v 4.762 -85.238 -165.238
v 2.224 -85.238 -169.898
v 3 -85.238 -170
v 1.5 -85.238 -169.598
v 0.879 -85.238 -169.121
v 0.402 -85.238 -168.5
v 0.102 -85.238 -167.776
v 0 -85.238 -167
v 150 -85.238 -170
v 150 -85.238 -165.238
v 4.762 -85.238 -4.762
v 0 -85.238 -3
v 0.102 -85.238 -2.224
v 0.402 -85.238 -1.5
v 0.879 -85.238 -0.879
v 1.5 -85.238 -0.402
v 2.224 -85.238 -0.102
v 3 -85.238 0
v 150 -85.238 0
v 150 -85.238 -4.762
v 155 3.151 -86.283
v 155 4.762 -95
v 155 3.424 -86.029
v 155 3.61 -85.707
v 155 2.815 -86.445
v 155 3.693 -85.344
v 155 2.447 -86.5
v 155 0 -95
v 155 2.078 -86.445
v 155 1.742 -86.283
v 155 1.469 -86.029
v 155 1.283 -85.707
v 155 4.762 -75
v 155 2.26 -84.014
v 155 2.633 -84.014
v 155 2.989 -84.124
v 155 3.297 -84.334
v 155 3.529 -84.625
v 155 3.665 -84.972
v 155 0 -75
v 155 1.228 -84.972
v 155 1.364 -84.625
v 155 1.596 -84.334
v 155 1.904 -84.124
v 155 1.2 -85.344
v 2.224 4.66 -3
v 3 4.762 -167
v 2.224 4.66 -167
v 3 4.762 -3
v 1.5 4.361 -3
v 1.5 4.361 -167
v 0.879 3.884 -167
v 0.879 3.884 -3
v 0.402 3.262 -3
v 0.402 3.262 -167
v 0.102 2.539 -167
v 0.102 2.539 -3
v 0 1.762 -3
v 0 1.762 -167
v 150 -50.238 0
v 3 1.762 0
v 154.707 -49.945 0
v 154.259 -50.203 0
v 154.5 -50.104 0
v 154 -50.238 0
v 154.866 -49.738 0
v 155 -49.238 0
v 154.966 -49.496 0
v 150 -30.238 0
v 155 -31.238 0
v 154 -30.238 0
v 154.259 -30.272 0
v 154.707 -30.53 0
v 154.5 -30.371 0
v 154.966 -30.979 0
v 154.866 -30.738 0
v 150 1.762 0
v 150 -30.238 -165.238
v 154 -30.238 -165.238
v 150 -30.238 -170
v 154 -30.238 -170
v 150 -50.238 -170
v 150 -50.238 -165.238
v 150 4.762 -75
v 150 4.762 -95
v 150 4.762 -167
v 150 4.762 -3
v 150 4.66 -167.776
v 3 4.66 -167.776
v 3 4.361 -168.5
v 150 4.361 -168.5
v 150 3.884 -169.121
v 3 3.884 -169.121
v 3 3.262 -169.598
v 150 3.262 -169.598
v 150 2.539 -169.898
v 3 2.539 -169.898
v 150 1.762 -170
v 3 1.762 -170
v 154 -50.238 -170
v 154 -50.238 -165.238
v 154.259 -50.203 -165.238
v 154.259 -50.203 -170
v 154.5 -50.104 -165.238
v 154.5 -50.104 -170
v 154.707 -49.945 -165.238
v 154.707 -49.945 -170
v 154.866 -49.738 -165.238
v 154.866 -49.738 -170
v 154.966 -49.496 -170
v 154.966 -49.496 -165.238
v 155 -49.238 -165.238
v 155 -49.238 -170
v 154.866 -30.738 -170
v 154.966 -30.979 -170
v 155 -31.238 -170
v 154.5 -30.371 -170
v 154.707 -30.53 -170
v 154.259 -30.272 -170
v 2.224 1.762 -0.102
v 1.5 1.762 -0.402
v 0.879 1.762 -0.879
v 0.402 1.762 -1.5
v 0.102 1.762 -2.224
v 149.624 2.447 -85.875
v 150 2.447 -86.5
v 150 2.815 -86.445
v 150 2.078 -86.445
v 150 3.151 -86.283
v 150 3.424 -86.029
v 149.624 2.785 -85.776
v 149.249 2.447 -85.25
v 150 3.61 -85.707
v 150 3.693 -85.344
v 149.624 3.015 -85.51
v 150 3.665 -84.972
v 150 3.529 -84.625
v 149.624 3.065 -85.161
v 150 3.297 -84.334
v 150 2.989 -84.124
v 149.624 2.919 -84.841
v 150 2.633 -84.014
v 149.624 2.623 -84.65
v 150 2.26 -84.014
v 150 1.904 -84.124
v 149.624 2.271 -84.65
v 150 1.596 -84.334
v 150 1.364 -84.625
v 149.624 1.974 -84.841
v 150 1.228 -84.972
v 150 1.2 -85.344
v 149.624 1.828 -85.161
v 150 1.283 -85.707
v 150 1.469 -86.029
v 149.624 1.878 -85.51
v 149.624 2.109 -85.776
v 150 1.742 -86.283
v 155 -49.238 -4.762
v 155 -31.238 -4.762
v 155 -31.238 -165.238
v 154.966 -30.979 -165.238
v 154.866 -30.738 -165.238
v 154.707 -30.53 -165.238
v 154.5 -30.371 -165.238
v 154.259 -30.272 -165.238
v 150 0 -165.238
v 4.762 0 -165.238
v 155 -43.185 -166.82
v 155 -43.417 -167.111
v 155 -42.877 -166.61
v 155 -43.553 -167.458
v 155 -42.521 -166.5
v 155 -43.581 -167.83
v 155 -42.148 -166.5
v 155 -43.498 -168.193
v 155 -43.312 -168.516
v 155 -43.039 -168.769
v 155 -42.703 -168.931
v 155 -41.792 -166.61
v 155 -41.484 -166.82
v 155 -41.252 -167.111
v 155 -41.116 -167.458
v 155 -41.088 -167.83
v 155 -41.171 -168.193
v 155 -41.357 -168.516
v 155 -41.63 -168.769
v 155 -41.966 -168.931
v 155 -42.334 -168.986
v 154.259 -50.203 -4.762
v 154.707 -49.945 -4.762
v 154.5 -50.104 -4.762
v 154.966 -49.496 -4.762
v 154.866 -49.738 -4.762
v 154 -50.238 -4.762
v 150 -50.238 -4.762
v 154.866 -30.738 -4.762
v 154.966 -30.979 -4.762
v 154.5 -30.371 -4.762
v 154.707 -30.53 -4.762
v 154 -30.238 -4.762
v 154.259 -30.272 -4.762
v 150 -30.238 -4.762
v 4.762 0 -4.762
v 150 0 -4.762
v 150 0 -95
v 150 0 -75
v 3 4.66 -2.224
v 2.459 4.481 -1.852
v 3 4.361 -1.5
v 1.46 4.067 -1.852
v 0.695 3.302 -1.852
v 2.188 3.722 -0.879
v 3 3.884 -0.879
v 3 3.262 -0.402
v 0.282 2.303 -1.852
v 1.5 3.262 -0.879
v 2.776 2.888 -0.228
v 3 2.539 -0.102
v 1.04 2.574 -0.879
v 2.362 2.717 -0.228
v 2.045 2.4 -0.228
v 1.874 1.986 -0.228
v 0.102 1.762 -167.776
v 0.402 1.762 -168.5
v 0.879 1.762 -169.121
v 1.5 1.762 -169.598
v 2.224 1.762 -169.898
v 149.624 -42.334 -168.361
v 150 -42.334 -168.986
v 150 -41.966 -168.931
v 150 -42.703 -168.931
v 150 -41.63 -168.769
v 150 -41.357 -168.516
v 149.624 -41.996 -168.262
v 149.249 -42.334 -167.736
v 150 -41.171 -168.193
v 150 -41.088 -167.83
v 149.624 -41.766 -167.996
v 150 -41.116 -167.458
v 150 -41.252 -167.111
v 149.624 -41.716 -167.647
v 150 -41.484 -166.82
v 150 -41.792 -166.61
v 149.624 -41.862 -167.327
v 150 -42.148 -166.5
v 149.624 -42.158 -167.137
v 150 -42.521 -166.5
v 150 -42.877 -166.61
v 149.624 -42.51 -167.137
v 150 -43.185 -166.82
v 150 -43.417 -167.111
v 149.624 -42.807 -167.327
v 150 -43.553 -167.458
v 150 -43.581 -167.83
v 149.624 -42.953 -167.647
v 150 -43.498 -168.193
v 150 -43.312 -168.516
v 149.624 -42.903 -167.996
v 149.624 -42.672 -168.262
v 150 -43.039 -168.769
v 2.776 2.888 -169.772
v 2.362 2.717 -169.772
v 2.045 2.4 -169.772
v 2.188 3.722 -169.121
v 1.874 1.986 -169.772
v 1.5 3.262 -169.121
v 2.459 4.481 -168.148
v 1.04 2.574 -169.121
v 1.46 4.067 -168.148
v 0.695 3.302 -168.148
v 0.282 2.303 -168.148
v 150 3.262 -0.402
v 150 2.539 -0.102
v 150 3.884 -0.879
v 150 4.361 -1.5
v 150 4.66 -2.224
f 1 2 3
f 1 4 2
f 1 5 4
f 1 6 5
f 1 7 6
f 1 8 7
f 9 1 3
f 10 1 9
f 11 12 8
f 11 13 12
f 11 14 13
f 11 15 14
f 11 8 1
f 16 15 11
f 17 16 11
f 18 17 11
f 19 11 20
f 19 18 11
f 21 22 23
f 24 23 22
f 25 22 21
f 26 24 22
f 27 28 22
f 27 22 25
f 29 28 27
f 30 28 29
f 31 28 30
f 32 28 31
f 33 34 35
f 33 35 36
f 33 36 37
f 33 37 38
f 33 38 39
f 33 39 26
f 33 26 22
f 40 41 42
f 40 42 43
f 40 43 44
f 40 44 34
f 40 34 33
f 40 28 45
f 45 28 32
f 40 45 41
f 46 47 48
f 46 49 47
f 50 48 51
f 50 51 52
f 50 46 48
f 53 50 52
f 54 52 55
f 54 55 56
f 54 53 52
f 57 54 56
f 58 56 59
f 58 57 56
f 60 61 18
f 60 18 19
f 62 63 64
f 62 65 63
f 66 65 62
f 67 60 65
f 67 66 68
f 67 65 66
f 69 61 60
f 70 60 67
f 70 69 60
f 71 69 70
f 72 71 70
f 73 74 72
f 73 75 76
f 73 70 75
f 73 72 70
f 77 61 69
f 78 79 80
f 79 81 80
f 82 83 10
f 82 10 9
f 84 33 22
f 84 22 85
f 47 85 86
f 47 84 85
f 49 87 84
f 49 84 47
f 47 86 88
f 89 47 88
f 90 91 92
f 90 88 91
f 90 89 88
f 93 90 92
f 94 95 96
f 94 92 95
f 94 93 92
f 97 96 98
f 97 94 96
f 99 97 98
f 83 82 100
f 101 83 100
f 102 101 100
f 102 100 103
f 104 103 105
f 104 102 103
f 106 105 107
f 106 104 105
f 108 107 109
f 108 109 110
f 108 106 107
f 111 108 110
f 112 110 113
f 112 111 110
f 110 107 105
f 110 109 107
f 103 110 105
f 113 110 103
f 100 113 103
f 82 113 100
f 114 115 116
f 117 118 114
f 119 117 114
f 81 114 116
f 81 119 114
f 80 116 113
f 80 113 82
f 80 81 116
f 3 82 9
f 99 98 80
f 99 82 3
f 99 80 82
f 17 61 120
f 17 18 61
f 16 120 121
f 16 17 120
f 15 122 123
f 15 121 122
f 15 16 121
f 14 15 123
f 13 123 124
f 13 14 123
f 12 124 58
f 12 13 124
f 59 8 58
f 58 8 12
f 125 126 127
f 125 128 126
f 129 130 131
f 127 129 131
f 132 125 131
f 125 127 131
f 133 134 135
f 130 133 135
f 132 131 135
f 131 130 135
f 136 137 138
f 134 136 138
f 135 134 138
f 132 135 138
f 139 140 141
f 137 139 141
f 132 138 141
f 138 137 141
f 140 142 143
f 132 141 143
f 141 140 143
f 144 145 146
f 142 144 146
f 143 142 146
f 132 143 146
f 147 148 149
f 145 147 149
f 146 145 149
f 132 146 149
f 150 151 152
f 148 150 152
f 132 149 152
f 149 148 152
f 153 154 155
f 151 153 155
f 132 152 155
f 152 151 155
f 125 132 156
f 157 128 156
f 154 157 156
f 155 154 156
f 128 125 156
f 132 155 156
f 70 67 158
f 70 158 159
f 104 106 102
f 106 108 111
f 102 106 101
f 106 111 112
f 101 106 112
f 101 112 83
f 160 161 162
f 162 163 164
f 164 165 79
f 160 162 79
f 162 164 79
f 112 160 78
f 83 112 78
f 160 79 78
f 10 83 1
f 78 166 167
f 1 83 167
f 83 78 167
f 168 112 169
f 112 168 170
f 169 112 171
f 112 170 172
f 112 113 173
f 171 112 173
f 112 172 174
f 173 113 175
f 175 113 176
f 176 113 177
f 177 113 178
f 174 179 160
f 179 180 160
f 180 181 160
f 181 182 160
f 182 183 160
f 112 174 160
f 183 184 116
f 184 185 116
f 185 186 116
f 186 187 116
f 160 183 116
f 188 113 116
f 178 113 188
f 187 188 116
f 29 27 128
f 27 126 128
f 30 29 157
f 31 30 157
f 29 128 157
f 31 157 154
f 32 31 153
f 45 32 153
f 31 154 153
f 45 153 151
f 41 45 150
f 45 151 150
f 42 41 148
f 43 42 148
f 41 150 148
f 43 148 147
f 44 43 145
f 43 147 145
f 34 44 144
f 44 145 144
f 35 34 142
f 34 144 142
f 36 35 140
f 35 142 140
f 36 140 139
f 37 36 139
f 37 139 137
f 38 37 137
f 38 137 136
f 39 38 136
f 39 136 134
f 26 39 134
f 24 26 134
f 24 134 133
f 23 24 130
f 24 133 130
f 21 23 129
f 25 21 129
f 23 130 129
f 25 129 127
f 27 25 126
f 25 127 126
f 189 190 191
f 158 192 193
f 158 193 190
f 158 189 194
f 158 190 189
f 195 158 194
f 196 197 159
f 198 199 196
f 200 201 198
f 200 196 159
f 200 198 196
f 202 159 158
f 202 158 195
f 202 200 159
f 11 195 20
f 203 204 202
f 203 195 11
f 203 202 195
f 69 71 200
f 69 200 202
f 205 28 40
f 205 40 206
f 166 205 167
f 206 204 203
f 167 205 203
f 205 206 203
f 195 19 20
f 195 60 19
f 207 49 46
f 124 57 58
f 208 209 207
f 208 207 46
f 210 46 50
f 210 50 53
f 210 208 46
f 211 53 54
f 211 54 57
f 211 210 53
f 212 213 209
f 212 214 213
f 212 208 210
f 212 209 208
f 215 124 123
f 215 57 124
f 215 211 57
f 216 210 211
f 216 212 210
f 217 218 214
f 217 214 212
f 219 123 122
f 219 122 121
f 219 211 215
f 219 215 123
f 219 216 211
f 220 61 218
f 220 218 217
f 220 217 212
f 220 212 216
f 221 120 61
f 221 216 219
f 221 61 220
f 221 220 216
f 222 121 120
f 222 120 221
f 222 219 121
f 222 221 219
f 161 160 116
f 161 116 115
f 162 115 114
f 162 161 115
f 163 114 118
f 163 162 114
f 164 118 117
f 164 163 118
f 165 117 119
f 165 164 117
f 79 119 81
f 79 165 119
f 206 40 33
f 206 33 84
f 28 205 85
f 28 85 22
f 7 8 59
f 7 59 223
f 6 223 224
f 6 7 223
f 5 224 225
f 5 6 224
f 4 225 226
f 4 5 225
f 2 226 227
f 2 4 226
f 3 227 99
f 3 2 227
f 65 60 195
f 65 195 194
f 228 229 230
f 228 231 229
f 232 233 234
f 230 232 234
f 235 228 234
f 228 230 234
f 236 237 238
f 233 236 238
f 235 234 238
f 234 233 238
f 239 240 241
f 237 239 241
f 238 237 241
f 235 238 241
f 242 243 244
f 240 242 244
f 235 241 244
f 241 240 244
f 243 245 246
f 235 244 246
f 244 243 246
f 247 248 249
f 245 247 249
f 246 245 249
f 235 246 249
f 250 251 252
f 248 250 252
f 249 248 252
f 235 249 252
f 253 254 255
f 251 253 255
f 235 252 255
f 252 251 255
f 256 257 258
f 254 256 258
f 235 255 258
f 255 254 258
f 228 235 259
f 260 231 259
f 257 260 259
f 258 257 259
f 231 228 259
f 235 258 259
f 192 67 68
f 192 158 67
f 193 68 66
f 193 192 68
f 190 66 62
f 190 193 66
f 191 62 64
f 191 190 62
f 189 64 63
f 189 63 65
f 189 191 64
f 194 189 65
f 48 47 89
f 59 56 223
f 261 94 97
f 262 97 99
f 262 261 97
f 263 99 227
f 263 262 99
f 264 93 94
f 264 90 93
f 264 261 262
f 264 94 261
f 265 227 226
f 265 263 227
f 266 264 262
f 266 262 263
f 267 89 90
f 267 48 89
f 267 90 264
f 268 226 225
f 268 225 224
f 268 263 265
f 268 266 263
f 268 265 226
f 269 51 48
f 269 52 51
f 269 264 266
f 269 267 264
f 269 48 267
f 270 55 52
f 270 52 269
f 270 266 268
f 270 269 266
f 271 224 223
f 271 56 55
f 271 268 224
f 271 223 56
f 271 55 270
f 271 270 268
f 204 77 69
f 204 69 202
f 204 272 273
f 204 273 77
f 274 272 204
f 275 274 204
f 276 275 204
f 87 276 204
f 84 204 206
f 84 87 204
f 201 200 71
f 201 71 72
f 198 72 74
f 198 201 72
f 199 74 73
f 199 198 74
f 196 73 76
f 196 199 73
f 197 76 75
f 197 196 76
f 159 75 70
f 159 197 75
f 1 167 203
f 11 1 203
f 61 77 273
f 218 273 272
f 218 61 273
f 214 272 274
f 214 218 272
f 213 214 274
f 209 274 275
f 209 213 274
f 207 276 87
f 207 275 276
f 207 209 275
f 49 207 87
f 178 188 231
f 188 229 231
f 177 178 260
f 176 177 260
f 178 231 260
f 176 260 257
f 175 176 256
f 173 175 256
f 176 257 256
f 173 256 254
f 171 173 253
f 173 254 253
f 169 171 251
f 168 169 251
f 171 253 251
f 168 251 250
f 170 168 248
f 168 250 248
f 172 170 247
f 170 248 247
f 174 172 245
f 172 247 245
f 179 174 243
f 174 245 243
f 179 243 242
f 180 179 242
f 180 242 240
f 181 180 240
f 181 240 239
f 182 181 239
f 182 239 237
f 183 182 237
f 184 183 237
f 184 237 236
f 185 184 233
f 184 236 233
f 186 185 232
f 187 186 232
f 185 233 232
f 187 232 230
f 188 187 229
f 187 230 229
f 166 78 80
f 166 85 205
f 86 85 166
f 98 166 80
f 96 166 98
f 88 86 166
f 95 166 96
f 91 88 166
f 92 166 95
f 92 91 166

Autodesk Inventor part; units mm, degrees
ref_plane "YZ Plane" through (0, 0, 0) normal (1, 0, 0) x (0, 1, 0)
ref_plane "XZ Plane" through (0, 0, 0) normal (0, 1, 0) x (-1, 0, 0)
ref_plane "XY Plane" through (0, 0, 0) normal (0, 0, 1) x (1, 0, 0)
sketch "Sketch1" plane through (0, 0, 0) normal (0, 1, 0) x (-1, 0, 0)
  line L0 (0, 0) -> (-150, 0)
  line L1 (0, -170) -> (0, 0)
  line L2 (0, -170) -> (-150, -170)
  line L3 (-150, -170) -> (-150, -95)
  line L4 (-150, -95) -> (-155, -95)
  line L5 (-155, -95) -> (-155, -75)
  line L6 (-155, -75) -> (-150, -75)
  line L7 (-150, -75) -> (-150, 0)
  dimension "d28" = 150
  dimension "d29" = 170
  dimension "d30" = 5
  dimension "d31" = 5
  dimension "d32" = 75
  dimension "d33" = 75
  dimension "d34" = 20
  dimension "d35" = 150
extrude "Extrusion1" add sketch "Sketch1" along normal blind 4.7625
sketch "Sketch2" plane through (0, 0, 0) normal (0, -1, 0) x (1, 0, 0)
  line L0 (0, 0) -> (150, 0) projected
  line L1 (0, 0) -> (4.7625, 0)
  line L2 (150, -170) -> (0, -170) projected
  line L3 (0, 0) -> (0, -170)
  line L4 (0, -170) -> (4.7625, -170)
  line L5 (4.7625, -170) -> (4.7625, 0)
  point P0 (0, -90)
  point P1 (4.7625, -90)
  dimension "d10" = 90
  dimension "d11" = 4.7625
extrude "Extrusion2" add sketch "Sketch2" along normal blind 85.2375
sketch "Sketch3" plane through (0, 0, 0) normal (0, -1, 0) x (1, 0, 0)
  line L0 (150, -95) -> (150, -170) projected
  line L1 (150, -170) -> (150, -165.2375)
  line L2 (150, -165.2375) -> (4.7625, -165.2375)
  line L3 (4.7625, 0) -> (4.7625, -170) projected
  line L4 (150, -170) -> (4.7625, -170) projected
  line L5 (4.7625, -170) -> (4.7625, -165.2375)
  line L6 (150, -170) -> (4.7625, -170)
  line L7 (150, -170) -> (150, -165.2375)
  point P0 (0, 0)
  dimension "d36" = 4.7625
sketch "Sketch4" plane through (0, 0, 0) normal (0, -1, 0) x (1, 0, 0)
  line L0 (150, 0) -> (150, -35) projected
  line L1 (150, 0) -> (150, -4.7625)
  line L2 (150, -4.7625) -> (4.7625, -4.7625)
  line L3 (4.7625, -85.2375) -> (4.7625, 0) projected
  line L4 (4.7625, 0) -> (150, 0)
  line L5 (4.7625, 0) -> (150, 0) projected
  line L6 (4.7625, -4.7625) -> (4.7625, 0)
  point P0 (0, 0)
  dimension "d17" = 4.7625
extrude "Extrusion4" add sketch "Sketch4" along normal blind 85.2375
sketch "Sketch6" plane through (0, 4.7625, 0) normal (0, 0, 1) x (1, 0, 0)
  line L0 (150, -4.7625) -> (150, -90) projected
  line L1 (150, -4.7625) -> (150, -90) projected
  line L2 (150, -90) -> (0, -90) projected
  line L3 (0, 0) -> (150, 0) projected
  line L4 (150, -55) -> (155, -55)
  line L5 (155, -55) -> (155, -35)
  line L6 (155, -35) -> (150, -35)
  line L7 (150, -35) -> (150, -55)
  point P0 (0, -4.7625)
  point P1 (150, -31.3995)
  dimension "d90" = 20
  dimension "d91" = 5
  dimension "d92" = 35
  dimension "d93" = 35
extrude "Extrusion6" add sketch "Sketch6" against normal blind 4.7625
extrude "Extrusion7" add sketch "Sketch3" along normal blind 85.2375
sketch "Sketch7" plane through (150, 4.7625, -170) normal (0, 0, -1) x (-1, 0, 0)
  line L0 (0, -4.7625) -> (0, -90) projected
  line L1 (0, -55) -> (-5, -55)
  line L2 (-5, -55) -> (-5, -35)
  line L3 (-5, -35) -> (0, -35)
  line L4 (0, -35) -> (0, -55)
  line L5 (150, -90) -> (0, -90) projected
  line L6 (0, 0) -> (150, 0) projected
  point P0 (150, -4.7625)
  point P1 (-5, -31.3995)
  dimension "d74" = 20
  dimension "d75" = 5
  dimension "d76" = 35
  dimension "d77" = 35
extrude "Extrusion8" add sketch "Sketch7" against normal blind 4.7625
fillet "Fillet3" radius 3 1 edges at (0, 4.7625, -85)
fillet "Fillet4" radius 3 6 edges at (0.8787, 3.8838, -170) (0, -41.7375, -170) (76.5, 4.7625, -170) (0.8787, 3.8838, 0) (0, -41.7375, 0) (76.5, 4.7625, 0)
hole "Hole3" at (155, 2.4466, -85.2501) direction (-1, 0, 0) diameter 2.5 depth 5 tip angle 118
hole "Hole4" at (155, -42.3344, -167.7364) direction (-1, 0, 0) diameter 2.5 depth 5 tip angle 118
fillet "Fillet5" radius 1 2 edges at (155, -50.2375, -167.6188) (155, -30.2375, -167.6188)
fillet "Fillet6" radius 1 2 edges at (155, -50.2375, -2.3813) (155, -30.2375, -2.3813)
properties part number "OpticalDeviceObjectPart"
